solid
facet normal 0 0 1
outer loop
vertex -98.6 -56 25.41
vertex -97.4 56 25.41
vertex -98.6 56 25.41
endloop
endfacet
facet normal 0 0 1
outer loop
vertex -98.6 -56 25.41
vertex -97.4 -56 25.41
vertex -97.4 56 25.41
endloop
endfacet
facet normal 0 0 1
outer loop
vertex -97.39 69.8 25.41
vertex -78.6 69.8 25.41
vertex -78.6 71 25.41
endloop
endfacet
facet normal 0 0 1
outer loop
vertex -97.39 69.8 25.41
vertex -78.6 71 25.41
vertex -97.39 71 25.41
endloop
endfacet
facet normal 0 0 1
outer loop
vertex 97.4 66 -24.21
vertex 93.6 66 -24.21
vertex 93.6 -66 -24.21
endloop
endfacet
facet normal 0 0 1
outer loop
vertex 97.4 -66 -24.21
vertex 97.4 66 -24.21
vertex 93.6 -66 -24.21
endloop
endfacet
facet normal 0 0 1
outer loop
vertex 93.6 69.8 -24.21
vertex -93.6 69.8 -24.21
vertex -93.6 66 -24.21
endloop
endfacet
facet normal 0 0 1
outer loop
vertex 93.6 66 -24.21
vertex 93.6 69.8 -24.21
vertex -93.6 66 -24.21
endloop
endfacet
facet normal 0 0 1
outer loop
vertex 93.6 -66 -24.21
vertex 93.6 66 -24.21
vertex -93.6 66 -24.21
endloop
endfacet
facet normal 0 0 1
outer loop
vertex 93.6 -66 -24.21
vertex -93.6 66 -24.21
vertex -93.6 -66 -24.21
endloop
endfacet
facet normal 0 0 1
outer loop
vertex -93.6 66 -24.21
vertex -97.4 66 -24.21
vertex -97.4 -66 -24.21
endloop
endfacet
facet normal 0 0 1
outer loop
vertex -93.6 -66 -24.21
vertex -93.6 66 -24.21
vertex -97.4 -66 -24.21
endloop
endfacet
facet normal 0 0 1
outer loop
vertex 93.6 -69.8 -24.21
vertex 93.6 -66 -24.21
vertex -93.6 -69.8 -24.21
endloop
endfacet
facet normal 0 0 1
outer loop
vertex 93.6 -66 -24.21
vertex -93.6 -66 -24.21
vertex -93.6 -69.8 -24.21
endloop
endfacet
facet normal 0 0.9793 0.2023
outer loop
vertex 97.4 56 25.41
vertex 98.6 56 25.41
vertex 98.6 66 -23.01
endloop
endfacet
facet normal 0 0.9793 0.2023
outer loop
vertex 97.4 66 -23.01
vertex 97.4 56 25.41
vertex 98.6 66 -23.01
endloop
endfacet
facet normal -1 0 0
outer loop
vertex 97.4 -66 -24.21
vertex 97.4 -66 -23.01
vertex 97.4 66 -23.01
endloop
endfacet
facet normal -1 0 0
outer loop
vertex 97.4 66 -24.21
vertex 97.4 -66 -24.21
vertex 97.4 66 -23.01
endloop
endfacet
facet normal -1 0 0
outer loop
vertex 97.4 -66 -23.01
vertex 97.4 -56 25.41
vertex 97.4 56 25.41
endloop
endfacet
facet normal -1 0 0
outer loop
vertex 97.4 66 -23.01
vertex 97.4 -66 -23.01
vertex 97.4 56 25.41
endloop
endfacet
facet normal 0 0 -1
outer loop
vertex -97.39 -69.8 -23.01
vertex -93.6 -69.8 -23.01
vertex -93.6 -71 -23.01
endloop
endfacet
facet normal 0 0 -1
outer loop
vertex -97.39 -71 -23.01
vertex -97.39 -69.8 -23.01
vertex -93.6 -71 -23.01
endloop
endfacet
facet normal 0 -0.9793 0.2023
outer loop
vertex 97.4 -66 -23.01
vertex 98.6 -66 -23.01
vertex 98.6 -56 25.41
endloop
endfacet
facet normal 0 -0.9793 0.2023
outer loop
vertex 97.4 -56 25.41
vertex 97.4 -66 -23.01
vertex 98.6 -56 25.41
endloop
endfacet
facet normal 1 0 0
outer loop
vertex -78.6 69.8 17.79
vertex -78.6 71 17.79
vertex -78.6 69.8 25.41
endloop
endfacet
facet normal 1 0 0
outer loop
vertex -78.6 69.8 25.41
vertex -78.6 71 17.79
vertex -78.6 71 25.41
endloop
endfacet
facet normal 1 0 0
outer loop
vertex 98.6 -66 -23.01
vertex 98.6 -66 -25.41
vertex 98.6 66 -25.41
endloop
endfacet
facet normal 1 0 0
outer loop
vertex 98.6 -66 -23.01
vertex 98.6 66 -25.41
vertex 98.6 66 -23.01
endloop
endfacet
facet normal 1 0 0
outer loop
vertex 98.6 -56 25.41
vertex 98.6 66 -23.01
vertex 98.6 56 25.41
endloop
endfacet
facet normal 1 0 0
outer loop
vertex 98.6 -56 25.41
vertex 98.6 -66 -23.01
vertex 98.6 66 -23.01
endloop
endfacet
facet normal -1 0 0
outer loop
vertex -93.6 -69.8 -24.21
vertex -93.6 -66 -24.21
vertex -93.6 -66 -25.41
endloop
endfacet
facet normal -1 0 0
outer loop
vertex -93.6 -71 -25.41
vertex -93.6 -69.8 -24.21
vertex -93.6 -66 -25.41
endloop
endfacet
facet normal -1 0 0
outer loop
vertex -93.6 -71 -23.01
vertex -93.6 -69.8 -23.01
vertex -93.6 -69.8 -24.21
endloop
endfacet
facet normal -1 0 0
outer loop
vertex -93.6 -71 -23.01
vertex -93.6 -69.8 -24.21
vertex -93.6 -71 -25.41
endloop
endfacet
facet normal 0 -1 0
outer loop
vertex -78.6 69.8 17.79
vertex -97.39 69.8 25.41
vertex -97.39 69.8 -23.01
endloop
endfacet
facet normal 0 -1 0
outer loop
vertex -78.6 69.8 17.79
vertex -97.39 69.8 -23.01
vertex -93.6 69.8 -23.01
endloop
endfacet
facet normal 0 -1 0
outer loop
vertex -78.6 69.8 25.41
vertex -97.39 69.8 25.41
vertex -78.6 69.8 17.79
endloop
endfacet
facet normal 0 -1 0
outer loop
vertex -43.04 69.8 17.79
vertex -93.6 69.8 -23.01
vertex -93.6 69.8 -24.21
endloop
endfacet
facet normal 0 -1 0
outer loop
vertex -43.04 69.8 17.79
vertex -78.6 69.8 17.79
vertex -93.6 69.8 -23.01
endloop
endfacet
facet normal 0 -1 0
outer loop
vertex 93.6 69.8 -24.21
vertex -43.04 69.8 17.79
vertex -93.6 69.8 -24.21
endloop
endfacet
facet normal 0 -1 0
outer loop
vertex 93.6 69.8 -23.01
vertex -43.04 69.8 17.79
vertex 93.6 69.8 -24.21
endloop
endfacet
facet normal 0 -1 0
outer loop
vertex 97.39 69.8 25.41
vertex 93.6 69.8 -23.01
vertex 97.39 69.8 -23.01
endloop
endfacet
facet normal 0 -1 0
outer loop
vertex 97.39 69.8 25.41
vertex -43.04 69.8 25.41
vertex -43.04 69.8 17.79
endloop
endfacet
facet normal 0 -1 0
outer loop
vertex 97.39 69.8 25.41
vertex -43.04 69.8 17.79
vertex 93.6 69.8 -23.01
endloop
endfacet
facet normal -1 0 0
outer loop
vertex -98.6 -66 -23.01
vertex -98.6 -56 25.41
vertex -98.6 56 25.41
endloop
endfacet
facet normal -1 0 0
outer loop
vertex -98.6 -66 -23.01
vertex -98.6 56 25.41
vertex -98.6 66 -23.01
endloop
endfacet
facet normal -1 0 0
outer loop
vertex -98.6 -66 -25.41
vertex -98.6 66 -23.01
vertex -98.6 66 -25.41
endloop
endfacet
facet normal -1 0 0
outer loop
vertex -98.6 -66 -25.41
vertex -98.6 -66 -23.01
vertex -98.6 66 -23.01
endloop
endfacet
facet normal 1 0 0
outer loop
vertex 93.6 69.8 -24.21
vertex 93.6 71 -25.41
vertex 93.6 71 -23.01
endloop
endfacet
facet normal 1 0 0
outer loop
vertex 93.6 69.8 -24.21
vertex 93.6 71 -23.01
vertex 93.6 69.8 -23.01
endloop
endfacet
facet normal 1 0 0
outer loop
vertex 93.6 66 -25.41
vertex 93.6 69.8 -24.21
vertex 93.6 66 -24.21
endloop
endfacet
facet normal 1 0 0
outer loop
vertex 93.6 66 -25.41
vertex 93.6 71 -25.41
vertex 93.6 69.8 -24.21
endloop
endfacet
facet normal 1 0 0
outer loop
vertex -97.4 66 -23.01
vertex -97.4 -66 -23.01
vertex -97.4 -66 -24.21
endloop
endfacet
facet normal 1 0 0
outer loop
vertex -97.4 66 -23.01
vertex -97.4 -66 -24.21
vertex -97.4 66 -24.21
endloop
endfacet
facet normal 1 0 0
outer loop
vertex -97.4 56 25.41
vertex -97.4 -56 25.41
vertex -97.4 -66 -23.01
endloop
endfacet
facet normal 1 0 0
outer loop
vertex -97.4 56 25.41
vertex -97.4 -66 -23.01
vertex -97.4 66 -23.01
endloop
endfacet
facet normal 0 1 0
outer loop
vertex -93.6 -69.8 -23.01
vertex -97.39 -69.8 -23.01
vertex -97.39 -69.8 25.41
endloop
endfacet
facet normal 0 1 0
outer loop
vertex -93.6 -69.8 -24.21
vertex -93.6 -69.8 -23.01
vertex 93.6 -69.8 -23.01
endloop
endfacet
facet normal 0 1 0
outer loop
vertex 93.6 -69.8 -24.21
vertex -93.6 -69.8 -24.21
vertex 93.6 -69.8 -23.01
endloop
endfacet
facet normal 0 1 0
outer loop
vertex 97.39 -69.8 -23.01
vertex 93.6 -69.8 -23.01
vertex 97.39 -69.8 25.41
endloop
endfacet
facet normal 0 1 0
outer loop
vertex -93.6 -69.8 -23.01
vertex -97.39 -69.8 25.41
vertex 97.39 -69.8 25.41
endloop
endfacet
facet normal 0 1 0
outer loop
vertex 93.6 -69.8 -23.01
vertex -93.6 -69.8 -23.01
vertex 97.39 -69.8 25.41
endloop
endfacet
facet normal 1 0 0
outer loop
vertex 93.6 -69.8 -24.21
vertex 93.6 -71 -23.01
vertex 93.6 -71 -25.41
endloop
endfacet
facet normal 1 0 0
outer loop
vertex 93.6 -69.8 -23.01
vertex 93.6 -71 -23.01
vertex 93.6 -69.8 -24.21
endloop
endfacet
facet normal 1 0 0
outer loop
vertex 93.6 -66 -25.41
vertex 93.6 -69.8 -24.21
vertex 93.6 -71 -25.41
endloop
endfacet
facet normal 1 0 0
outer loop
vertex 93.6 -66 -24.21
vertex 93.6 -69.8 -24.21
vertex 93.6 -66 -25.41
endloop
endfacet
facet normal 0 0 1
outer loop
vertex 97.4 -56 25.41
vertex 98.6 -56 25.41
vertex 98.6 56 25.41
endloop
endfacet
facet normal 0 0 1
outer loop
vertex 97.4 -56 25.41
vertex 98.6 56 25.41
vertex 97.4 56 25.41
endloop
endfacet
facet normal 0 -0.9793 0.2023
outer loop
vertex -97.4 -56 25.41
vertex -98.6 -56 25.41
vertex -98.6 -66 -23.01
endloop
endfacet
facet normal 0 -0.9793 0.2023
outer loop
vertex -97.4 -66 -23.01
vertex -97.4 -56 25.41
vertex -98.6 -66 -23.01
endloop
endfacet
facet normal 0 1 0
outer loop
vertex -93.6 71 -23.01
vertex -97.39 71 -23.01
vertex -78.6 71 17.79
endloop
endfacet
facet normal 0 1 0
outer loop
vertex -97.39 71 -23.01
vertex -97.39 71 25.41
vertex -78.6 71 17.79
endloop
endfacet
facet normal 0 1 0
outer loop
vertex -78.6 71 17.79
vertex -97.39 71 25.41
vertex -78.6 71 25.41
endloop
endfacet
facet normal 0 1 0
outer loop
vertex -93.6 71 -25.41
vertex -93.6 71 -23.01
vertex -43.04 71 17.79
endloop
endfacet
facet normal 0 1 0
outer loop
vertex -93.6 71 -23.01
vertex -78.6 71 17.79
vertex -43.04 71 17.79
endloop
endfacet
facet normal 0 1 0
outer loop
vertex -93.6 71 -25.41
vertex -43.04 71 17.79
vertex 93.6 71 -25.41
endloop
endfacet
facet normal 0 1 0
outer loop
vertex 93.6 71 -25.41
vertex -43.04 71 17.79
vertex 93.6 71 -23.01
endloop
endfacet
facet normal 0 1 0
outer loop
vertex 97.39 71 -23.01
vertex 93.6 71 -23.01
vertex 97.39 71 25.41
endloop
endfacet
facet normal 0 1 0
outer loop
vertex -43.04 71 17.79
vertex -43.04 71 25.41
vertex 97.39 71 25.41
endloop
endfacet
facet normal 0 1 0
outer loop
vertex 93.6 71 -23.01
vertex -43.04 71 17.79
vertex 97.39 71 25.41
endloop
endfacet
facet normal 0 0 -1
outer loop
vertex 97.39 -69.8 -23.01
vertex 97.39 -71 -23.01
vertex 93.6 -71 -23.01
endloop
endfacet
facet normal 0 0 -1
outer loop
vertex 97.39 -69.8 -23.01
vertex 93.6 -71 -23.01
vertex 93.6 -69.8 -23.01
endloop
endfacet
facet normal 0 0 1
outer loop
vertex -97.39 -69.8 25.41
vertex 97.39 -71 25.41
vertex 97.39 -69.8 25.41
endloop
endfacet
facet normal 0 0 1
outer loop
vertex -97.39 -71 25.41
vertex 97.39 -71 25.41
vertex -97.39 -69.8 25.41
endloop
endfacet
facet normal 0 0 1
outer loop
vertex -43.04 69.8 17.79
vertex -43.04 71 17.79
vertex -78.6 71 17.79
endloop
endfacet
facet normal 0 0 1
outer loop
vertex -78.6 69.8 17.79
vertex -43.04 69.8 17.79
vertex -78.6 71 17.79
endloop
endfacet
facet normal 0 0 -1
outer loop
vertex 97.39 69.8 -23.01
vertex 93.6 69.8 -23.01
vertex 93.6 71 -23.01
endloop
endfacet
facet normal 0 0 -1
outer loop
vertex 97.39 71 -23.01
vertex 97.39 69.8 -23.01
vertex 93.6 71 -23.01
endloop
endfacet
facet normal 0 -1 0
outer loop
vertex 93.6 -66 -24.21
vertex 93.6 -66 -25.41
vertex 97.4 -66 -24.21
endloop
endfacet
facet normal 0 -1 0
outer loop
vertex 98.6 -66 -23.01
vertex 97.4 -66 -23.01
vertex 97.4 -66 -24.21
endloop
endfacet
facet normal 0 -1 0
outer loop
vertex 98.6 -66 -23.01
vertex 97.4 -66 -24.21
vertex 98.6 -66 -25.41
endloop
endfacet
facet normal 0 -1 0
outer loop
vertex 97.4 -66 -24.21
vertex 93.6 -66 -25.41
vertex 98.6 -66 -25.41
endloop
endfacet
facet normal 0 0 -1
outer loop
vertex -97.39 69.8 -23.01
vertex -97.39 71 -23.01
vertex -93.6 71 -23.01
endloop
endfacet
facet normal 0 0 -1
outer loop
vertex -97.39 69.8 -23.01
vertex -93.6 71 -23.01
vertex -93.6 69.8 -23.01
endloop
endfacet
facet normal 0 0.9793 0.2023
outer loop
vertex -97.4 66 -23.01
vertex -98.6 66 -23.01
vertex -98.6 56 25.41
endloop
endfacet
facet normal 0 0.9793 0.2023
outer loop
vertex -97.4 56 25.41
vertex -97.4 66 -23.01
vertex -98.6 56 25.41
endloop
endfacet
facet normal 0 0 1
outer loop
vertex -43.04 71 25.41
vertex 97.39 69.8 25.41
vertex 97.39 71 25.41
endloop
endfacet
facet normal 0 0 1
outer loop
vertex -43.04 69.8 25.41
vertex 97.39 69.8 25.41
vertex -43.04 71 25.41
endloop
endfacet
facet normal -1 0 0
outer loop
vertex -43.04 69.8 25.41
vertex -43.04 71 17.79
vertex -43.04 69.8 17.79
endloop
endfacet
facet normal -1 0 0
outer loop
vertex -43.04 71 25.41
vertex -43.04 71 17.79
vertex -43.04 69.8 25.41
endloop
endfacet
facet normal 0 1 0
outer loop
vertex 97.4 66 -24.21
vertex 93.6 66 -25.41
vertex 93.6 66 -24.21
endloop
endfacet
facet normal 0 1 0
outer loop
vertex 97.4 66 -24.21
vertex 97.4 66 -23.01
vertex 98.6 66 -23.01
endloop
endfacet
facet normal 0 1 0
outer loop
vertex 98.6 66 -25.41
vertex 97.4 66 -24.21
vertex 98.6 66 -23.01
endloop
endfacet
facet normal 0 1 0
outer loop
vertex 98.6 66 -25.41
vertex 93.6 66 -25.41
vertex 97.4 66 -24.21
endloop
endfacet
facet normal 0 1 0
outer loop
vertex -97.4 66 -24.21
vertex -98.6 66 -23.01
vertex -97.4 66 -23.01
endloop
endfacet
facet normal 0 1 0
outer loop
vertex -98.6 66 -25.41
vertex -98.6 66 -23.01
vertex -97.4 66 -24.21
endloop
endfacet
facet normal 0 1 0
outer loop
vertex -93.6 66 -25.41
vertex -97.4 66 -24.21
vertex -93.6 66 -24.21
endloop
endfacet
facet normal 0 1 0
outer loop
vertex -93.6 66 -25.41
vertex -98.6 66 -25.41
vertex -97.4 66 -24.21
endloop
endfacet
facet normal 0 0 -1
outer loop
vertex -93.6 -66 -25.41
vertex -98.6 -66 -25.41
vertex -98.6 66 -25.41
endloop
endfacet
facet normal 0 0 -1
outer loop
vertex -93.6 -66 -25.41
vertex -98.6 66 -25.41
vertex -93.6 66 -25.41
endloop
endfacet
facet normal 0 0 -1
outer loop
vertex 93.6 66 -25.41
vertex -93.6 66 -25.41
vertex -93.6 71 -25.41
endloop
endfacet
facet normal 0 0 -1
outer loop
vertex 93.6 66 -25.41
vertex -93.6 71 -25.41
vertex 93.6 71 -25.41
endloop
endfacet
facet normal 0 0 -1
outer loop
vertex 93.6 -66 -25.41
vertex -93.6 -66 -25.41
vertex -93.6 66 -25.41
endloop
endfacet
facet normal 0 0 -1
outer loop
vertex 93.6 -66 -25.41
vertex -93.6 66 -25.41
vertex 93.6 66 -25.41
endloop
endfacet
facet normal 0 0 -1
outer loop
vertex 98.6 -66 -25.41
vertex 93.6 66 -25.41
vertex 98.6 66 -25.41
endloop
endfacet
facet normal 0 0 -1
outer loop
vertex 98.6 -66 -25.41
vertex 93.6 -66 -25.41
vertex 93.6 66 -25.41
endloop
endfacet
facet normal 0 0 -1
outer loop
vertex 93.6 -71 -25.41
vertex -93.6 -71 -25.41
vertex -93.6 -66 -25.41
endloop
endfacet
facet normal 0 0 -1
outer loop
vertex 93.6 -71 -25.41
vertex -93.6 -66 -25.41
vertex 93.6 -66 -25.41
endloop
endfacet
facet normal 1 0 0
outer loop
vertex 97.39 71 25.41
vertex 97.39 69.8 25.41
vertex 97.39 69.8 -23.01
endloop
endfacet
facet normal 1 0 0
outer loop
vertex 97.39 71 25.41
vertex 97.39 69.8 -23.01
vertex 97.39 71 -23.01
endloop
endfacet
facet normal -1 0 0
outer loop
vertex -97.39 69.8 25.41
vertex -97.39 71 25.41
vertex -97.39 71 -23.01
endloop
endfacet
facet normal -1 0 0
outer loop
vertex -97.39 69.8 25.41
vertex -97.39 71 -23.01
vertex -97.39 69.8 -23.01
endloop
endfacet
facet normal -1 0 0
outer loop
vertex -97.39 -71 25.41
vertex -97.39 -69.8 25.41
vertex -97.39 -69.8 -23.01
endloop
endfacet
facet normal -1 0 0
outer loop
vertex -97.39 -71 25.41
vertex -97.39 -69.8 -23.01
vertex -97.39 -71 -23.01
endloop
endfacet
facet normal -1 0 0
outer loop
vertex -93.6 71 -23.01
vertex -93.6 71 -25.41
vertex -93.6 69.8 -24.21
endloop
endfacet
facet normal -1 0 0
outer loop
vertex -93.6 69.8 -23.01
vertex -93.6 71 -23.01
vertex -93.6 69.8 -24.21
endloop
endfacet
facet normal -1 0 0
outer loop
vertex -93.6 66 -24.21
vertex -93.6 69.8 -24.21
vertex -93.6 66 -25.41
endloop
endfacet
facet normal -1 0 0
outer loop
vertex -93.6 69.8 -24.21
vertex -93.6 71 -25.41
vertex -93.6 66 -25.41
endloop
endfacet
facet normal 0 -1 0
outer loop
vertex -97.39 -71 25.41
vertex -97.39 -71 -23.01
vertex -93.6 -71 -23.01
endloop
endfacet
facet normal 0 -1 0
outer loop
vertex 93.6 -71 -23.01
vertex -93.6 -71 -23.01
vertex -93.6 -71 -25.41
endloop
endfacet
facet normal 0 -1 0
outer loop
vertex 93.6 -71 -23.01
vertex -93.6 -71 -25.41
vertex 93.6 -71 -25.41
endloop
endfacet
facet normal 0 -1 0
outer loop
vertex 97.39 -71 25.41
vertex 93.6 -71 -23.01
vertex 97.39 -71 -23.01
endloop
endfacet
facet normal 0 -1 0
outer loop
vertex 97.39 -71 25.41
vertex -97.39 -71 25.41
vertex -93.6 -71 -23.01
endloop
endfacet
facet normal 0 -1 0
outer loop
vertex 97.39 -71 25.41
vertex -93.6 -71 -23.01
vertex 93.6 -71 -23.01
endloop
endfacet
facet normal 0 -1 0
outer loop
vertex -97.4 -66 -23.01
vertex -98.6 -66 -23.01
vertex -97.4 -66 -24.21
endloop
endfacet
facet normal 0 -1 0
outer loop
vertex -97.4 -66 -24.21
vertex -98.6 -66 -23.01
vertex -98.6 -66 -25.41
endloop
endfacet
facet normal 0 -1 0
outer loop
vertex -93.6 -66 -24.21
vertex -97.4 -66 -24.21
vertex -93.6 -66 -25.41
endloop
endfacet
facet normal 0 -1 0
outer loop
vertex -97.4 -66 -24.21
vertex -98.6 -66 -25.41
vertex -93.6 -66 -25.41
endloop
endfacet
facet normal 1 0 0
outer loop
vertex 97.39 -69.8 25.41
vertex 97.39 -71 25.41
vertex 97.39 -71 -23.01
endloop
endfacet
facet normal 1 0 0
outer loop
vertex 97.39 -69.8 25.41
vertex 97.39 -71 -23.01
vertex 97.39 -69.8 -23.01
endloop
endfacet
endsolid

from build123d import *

# Parameters (mm, degrees)
F1_DEPTH      = 71
F1_DEPTH_BACK = 71
F2_W          = 194.8
F2_H          = 139.6
F3_DEPTH      = 49.62
F4_W          = 35.56
F4_H          = 7.62
F5_DEPTH      = 25
F6_W          = 5
F6_H          = 1.2
F7_DEPTH      = 5
F8_W          = 1.2
F8_H          = 48.42
F9_DEPTH      = 1.21
F10_W         = 5
F10_H         = 1.2
F11_DEPTH     = 5
F12_W         = 1.2
F12_H         = 48.42
F13_DEPTH     = 1.21
F15_DEPTH     = 1.2
F17_DEPTH     = 1.2
F18_W         = 5
F18_H         = 5
F19_DEPTH     = 1.2


with BuildPart() as f1:
    # F0 (on Front) → F1 (new body, two sides)
    with BuildSketch(Plane.XZ) as f1_sk:
        Polygon((98.6, 25.41), (0, 25.41), (-98.6, 25.41), (-98.6, -25.41), (0, -25.41), (98.6, -25.41), align=None)
    extrude(amount=F1_DEPTH)
    extrude(f1_sk.sketch, amount=-F1_DEPTH_BACK)

    # F2 (on face) → F3 (cut)
    with BuildSketch(Plane.XY.offset(25.41)):
        Rectangle(F2_W, F2_H)
    extrude(amount=-F3_DEPTH, mode=Mode.SUBTRACT)

    # F4 (on face) → F5 (cut)
    with BuildSketch(Plane(origin=(0, 71, 0), x_dir=(-1, 0, 0), z_dir=(0, 1, 0))):
        with Locations((60.82, 21.6)):
            Rectangle(F4_W, F4_H)
    extrude(amount=-F5_DEPTH, mode=Mode.SUBTRACT)

    # F6 (on face) → F7 (cut)
    with BuildSketch(Plane(origin=(-98.6, 0, 0), x_dir=(0, -1, 0), z_dir=(-1, 0, 0))):
        with Locations((-68.5, -23.61)):
            Rectangle(F6_W, F6_H)
        with Locations((68.5, -23.61)):
            Rectangle(F6_W, F6_H)
    extrude(amount=-F7_DEPTH, mode=Mode.SUBTRACT)

    # F8 (on face) → F9 (cut)
    with BuildSketch(Plane(origin=(-98.6, 0, 0), x_dir=(0, -1, 0), z_dir=(-1, 0, 0))):
        with Locations((-70.4, 1.2)):
            Rectangle(F8_W, F8_H)
        with Locations((70.4, 1.2)):
            Rectangle(F8_W, F8_H)
    extrude(amount=-F9_DEPTH, mode=Mode.SUBTRACT)

    # F10 (on face) → F11 (cut)
    with BuildSketch(Plane.YZ.offset(98.6)):
        with Locations((68.5, -23.61)):
            Rectangle(F10_W, F10_H)
        with Locations((-68.5, -23.61)):
            Rectangle(F10_W, F10_H)
    extrude(amount=-F11_DEPTH, mode=Mode.SUBTRACT)

    # F12 (on face) → F13 (cut)
    with BuildSketch(Plane.YZ.offset(98.6)):
        with Locations((-70.4, 1.2)):
            Rectangle(F12_W, F12_H)
        with Locations((70.4, 1.2)):
            Rectangle(F12_W, F12_H)
    extrude(amount=-F13_DEPTH, mode=Mode.SUBTRACT)

    # F14 (on face) → F15 (cut, through all)
    with BuildSketch(Plane(origin=(-98.6, 0, 0), x_dir=(0, -1, 0), z_dir=(-1, 0, 0))):
        Polygon((-56, 25.41), (-66, 25.41), (-69.8, 25.41), (-69.8, -23.01), (-66, -23.01), align=None)
        Polygon((69.8, 25.41), (66, 25.41), (56, 25.41), (66, -23.01), (69.8, -23.01), align=None)
    extrude(amount=-F15_DEPTH, mode=Mode.SUBTRACT)

    # F16 (on face) → F17 (cut, through all)
    with BuildSketch(Plane.YZ.offset(98.6)):
        Polygon((-56, 25.41), (-66, 25.41), (-69.8, 25.41), (-69.8, -23.01), (-66, -23.01), align=None)
        Polygon((66, -23.01), (69.8, -23.01), (69.8, 25.41), (56, 25.41), align=None)
    extrude(amount=-F17_DEPTH, mode=Mode.SUBTRACT)

    # F18 (on face) → F19 (cut, through all)
    with BuildSketch(Plane(origin=(0, 0, -25.41), x_dir=(1, 0, 0), z_dir=(0, 0, -1))):
        with Locations((-96.1, -68.5)):
            Rectangle(F18_W, F18_H)
        with Locations((96.1, -68.5)):
            Rectangle(F18_W, F18_H)
        with Locations((96.1, 68.5)):
            Rectangle(F18_W, F18_H)
        with Locations((-96.1, 68.5)):
            Rectangle(F18_W, F18_H)
    extrude(amount=-F19_DEPTH, mode=Mode.SUBTRACT)


solid = f1.part
